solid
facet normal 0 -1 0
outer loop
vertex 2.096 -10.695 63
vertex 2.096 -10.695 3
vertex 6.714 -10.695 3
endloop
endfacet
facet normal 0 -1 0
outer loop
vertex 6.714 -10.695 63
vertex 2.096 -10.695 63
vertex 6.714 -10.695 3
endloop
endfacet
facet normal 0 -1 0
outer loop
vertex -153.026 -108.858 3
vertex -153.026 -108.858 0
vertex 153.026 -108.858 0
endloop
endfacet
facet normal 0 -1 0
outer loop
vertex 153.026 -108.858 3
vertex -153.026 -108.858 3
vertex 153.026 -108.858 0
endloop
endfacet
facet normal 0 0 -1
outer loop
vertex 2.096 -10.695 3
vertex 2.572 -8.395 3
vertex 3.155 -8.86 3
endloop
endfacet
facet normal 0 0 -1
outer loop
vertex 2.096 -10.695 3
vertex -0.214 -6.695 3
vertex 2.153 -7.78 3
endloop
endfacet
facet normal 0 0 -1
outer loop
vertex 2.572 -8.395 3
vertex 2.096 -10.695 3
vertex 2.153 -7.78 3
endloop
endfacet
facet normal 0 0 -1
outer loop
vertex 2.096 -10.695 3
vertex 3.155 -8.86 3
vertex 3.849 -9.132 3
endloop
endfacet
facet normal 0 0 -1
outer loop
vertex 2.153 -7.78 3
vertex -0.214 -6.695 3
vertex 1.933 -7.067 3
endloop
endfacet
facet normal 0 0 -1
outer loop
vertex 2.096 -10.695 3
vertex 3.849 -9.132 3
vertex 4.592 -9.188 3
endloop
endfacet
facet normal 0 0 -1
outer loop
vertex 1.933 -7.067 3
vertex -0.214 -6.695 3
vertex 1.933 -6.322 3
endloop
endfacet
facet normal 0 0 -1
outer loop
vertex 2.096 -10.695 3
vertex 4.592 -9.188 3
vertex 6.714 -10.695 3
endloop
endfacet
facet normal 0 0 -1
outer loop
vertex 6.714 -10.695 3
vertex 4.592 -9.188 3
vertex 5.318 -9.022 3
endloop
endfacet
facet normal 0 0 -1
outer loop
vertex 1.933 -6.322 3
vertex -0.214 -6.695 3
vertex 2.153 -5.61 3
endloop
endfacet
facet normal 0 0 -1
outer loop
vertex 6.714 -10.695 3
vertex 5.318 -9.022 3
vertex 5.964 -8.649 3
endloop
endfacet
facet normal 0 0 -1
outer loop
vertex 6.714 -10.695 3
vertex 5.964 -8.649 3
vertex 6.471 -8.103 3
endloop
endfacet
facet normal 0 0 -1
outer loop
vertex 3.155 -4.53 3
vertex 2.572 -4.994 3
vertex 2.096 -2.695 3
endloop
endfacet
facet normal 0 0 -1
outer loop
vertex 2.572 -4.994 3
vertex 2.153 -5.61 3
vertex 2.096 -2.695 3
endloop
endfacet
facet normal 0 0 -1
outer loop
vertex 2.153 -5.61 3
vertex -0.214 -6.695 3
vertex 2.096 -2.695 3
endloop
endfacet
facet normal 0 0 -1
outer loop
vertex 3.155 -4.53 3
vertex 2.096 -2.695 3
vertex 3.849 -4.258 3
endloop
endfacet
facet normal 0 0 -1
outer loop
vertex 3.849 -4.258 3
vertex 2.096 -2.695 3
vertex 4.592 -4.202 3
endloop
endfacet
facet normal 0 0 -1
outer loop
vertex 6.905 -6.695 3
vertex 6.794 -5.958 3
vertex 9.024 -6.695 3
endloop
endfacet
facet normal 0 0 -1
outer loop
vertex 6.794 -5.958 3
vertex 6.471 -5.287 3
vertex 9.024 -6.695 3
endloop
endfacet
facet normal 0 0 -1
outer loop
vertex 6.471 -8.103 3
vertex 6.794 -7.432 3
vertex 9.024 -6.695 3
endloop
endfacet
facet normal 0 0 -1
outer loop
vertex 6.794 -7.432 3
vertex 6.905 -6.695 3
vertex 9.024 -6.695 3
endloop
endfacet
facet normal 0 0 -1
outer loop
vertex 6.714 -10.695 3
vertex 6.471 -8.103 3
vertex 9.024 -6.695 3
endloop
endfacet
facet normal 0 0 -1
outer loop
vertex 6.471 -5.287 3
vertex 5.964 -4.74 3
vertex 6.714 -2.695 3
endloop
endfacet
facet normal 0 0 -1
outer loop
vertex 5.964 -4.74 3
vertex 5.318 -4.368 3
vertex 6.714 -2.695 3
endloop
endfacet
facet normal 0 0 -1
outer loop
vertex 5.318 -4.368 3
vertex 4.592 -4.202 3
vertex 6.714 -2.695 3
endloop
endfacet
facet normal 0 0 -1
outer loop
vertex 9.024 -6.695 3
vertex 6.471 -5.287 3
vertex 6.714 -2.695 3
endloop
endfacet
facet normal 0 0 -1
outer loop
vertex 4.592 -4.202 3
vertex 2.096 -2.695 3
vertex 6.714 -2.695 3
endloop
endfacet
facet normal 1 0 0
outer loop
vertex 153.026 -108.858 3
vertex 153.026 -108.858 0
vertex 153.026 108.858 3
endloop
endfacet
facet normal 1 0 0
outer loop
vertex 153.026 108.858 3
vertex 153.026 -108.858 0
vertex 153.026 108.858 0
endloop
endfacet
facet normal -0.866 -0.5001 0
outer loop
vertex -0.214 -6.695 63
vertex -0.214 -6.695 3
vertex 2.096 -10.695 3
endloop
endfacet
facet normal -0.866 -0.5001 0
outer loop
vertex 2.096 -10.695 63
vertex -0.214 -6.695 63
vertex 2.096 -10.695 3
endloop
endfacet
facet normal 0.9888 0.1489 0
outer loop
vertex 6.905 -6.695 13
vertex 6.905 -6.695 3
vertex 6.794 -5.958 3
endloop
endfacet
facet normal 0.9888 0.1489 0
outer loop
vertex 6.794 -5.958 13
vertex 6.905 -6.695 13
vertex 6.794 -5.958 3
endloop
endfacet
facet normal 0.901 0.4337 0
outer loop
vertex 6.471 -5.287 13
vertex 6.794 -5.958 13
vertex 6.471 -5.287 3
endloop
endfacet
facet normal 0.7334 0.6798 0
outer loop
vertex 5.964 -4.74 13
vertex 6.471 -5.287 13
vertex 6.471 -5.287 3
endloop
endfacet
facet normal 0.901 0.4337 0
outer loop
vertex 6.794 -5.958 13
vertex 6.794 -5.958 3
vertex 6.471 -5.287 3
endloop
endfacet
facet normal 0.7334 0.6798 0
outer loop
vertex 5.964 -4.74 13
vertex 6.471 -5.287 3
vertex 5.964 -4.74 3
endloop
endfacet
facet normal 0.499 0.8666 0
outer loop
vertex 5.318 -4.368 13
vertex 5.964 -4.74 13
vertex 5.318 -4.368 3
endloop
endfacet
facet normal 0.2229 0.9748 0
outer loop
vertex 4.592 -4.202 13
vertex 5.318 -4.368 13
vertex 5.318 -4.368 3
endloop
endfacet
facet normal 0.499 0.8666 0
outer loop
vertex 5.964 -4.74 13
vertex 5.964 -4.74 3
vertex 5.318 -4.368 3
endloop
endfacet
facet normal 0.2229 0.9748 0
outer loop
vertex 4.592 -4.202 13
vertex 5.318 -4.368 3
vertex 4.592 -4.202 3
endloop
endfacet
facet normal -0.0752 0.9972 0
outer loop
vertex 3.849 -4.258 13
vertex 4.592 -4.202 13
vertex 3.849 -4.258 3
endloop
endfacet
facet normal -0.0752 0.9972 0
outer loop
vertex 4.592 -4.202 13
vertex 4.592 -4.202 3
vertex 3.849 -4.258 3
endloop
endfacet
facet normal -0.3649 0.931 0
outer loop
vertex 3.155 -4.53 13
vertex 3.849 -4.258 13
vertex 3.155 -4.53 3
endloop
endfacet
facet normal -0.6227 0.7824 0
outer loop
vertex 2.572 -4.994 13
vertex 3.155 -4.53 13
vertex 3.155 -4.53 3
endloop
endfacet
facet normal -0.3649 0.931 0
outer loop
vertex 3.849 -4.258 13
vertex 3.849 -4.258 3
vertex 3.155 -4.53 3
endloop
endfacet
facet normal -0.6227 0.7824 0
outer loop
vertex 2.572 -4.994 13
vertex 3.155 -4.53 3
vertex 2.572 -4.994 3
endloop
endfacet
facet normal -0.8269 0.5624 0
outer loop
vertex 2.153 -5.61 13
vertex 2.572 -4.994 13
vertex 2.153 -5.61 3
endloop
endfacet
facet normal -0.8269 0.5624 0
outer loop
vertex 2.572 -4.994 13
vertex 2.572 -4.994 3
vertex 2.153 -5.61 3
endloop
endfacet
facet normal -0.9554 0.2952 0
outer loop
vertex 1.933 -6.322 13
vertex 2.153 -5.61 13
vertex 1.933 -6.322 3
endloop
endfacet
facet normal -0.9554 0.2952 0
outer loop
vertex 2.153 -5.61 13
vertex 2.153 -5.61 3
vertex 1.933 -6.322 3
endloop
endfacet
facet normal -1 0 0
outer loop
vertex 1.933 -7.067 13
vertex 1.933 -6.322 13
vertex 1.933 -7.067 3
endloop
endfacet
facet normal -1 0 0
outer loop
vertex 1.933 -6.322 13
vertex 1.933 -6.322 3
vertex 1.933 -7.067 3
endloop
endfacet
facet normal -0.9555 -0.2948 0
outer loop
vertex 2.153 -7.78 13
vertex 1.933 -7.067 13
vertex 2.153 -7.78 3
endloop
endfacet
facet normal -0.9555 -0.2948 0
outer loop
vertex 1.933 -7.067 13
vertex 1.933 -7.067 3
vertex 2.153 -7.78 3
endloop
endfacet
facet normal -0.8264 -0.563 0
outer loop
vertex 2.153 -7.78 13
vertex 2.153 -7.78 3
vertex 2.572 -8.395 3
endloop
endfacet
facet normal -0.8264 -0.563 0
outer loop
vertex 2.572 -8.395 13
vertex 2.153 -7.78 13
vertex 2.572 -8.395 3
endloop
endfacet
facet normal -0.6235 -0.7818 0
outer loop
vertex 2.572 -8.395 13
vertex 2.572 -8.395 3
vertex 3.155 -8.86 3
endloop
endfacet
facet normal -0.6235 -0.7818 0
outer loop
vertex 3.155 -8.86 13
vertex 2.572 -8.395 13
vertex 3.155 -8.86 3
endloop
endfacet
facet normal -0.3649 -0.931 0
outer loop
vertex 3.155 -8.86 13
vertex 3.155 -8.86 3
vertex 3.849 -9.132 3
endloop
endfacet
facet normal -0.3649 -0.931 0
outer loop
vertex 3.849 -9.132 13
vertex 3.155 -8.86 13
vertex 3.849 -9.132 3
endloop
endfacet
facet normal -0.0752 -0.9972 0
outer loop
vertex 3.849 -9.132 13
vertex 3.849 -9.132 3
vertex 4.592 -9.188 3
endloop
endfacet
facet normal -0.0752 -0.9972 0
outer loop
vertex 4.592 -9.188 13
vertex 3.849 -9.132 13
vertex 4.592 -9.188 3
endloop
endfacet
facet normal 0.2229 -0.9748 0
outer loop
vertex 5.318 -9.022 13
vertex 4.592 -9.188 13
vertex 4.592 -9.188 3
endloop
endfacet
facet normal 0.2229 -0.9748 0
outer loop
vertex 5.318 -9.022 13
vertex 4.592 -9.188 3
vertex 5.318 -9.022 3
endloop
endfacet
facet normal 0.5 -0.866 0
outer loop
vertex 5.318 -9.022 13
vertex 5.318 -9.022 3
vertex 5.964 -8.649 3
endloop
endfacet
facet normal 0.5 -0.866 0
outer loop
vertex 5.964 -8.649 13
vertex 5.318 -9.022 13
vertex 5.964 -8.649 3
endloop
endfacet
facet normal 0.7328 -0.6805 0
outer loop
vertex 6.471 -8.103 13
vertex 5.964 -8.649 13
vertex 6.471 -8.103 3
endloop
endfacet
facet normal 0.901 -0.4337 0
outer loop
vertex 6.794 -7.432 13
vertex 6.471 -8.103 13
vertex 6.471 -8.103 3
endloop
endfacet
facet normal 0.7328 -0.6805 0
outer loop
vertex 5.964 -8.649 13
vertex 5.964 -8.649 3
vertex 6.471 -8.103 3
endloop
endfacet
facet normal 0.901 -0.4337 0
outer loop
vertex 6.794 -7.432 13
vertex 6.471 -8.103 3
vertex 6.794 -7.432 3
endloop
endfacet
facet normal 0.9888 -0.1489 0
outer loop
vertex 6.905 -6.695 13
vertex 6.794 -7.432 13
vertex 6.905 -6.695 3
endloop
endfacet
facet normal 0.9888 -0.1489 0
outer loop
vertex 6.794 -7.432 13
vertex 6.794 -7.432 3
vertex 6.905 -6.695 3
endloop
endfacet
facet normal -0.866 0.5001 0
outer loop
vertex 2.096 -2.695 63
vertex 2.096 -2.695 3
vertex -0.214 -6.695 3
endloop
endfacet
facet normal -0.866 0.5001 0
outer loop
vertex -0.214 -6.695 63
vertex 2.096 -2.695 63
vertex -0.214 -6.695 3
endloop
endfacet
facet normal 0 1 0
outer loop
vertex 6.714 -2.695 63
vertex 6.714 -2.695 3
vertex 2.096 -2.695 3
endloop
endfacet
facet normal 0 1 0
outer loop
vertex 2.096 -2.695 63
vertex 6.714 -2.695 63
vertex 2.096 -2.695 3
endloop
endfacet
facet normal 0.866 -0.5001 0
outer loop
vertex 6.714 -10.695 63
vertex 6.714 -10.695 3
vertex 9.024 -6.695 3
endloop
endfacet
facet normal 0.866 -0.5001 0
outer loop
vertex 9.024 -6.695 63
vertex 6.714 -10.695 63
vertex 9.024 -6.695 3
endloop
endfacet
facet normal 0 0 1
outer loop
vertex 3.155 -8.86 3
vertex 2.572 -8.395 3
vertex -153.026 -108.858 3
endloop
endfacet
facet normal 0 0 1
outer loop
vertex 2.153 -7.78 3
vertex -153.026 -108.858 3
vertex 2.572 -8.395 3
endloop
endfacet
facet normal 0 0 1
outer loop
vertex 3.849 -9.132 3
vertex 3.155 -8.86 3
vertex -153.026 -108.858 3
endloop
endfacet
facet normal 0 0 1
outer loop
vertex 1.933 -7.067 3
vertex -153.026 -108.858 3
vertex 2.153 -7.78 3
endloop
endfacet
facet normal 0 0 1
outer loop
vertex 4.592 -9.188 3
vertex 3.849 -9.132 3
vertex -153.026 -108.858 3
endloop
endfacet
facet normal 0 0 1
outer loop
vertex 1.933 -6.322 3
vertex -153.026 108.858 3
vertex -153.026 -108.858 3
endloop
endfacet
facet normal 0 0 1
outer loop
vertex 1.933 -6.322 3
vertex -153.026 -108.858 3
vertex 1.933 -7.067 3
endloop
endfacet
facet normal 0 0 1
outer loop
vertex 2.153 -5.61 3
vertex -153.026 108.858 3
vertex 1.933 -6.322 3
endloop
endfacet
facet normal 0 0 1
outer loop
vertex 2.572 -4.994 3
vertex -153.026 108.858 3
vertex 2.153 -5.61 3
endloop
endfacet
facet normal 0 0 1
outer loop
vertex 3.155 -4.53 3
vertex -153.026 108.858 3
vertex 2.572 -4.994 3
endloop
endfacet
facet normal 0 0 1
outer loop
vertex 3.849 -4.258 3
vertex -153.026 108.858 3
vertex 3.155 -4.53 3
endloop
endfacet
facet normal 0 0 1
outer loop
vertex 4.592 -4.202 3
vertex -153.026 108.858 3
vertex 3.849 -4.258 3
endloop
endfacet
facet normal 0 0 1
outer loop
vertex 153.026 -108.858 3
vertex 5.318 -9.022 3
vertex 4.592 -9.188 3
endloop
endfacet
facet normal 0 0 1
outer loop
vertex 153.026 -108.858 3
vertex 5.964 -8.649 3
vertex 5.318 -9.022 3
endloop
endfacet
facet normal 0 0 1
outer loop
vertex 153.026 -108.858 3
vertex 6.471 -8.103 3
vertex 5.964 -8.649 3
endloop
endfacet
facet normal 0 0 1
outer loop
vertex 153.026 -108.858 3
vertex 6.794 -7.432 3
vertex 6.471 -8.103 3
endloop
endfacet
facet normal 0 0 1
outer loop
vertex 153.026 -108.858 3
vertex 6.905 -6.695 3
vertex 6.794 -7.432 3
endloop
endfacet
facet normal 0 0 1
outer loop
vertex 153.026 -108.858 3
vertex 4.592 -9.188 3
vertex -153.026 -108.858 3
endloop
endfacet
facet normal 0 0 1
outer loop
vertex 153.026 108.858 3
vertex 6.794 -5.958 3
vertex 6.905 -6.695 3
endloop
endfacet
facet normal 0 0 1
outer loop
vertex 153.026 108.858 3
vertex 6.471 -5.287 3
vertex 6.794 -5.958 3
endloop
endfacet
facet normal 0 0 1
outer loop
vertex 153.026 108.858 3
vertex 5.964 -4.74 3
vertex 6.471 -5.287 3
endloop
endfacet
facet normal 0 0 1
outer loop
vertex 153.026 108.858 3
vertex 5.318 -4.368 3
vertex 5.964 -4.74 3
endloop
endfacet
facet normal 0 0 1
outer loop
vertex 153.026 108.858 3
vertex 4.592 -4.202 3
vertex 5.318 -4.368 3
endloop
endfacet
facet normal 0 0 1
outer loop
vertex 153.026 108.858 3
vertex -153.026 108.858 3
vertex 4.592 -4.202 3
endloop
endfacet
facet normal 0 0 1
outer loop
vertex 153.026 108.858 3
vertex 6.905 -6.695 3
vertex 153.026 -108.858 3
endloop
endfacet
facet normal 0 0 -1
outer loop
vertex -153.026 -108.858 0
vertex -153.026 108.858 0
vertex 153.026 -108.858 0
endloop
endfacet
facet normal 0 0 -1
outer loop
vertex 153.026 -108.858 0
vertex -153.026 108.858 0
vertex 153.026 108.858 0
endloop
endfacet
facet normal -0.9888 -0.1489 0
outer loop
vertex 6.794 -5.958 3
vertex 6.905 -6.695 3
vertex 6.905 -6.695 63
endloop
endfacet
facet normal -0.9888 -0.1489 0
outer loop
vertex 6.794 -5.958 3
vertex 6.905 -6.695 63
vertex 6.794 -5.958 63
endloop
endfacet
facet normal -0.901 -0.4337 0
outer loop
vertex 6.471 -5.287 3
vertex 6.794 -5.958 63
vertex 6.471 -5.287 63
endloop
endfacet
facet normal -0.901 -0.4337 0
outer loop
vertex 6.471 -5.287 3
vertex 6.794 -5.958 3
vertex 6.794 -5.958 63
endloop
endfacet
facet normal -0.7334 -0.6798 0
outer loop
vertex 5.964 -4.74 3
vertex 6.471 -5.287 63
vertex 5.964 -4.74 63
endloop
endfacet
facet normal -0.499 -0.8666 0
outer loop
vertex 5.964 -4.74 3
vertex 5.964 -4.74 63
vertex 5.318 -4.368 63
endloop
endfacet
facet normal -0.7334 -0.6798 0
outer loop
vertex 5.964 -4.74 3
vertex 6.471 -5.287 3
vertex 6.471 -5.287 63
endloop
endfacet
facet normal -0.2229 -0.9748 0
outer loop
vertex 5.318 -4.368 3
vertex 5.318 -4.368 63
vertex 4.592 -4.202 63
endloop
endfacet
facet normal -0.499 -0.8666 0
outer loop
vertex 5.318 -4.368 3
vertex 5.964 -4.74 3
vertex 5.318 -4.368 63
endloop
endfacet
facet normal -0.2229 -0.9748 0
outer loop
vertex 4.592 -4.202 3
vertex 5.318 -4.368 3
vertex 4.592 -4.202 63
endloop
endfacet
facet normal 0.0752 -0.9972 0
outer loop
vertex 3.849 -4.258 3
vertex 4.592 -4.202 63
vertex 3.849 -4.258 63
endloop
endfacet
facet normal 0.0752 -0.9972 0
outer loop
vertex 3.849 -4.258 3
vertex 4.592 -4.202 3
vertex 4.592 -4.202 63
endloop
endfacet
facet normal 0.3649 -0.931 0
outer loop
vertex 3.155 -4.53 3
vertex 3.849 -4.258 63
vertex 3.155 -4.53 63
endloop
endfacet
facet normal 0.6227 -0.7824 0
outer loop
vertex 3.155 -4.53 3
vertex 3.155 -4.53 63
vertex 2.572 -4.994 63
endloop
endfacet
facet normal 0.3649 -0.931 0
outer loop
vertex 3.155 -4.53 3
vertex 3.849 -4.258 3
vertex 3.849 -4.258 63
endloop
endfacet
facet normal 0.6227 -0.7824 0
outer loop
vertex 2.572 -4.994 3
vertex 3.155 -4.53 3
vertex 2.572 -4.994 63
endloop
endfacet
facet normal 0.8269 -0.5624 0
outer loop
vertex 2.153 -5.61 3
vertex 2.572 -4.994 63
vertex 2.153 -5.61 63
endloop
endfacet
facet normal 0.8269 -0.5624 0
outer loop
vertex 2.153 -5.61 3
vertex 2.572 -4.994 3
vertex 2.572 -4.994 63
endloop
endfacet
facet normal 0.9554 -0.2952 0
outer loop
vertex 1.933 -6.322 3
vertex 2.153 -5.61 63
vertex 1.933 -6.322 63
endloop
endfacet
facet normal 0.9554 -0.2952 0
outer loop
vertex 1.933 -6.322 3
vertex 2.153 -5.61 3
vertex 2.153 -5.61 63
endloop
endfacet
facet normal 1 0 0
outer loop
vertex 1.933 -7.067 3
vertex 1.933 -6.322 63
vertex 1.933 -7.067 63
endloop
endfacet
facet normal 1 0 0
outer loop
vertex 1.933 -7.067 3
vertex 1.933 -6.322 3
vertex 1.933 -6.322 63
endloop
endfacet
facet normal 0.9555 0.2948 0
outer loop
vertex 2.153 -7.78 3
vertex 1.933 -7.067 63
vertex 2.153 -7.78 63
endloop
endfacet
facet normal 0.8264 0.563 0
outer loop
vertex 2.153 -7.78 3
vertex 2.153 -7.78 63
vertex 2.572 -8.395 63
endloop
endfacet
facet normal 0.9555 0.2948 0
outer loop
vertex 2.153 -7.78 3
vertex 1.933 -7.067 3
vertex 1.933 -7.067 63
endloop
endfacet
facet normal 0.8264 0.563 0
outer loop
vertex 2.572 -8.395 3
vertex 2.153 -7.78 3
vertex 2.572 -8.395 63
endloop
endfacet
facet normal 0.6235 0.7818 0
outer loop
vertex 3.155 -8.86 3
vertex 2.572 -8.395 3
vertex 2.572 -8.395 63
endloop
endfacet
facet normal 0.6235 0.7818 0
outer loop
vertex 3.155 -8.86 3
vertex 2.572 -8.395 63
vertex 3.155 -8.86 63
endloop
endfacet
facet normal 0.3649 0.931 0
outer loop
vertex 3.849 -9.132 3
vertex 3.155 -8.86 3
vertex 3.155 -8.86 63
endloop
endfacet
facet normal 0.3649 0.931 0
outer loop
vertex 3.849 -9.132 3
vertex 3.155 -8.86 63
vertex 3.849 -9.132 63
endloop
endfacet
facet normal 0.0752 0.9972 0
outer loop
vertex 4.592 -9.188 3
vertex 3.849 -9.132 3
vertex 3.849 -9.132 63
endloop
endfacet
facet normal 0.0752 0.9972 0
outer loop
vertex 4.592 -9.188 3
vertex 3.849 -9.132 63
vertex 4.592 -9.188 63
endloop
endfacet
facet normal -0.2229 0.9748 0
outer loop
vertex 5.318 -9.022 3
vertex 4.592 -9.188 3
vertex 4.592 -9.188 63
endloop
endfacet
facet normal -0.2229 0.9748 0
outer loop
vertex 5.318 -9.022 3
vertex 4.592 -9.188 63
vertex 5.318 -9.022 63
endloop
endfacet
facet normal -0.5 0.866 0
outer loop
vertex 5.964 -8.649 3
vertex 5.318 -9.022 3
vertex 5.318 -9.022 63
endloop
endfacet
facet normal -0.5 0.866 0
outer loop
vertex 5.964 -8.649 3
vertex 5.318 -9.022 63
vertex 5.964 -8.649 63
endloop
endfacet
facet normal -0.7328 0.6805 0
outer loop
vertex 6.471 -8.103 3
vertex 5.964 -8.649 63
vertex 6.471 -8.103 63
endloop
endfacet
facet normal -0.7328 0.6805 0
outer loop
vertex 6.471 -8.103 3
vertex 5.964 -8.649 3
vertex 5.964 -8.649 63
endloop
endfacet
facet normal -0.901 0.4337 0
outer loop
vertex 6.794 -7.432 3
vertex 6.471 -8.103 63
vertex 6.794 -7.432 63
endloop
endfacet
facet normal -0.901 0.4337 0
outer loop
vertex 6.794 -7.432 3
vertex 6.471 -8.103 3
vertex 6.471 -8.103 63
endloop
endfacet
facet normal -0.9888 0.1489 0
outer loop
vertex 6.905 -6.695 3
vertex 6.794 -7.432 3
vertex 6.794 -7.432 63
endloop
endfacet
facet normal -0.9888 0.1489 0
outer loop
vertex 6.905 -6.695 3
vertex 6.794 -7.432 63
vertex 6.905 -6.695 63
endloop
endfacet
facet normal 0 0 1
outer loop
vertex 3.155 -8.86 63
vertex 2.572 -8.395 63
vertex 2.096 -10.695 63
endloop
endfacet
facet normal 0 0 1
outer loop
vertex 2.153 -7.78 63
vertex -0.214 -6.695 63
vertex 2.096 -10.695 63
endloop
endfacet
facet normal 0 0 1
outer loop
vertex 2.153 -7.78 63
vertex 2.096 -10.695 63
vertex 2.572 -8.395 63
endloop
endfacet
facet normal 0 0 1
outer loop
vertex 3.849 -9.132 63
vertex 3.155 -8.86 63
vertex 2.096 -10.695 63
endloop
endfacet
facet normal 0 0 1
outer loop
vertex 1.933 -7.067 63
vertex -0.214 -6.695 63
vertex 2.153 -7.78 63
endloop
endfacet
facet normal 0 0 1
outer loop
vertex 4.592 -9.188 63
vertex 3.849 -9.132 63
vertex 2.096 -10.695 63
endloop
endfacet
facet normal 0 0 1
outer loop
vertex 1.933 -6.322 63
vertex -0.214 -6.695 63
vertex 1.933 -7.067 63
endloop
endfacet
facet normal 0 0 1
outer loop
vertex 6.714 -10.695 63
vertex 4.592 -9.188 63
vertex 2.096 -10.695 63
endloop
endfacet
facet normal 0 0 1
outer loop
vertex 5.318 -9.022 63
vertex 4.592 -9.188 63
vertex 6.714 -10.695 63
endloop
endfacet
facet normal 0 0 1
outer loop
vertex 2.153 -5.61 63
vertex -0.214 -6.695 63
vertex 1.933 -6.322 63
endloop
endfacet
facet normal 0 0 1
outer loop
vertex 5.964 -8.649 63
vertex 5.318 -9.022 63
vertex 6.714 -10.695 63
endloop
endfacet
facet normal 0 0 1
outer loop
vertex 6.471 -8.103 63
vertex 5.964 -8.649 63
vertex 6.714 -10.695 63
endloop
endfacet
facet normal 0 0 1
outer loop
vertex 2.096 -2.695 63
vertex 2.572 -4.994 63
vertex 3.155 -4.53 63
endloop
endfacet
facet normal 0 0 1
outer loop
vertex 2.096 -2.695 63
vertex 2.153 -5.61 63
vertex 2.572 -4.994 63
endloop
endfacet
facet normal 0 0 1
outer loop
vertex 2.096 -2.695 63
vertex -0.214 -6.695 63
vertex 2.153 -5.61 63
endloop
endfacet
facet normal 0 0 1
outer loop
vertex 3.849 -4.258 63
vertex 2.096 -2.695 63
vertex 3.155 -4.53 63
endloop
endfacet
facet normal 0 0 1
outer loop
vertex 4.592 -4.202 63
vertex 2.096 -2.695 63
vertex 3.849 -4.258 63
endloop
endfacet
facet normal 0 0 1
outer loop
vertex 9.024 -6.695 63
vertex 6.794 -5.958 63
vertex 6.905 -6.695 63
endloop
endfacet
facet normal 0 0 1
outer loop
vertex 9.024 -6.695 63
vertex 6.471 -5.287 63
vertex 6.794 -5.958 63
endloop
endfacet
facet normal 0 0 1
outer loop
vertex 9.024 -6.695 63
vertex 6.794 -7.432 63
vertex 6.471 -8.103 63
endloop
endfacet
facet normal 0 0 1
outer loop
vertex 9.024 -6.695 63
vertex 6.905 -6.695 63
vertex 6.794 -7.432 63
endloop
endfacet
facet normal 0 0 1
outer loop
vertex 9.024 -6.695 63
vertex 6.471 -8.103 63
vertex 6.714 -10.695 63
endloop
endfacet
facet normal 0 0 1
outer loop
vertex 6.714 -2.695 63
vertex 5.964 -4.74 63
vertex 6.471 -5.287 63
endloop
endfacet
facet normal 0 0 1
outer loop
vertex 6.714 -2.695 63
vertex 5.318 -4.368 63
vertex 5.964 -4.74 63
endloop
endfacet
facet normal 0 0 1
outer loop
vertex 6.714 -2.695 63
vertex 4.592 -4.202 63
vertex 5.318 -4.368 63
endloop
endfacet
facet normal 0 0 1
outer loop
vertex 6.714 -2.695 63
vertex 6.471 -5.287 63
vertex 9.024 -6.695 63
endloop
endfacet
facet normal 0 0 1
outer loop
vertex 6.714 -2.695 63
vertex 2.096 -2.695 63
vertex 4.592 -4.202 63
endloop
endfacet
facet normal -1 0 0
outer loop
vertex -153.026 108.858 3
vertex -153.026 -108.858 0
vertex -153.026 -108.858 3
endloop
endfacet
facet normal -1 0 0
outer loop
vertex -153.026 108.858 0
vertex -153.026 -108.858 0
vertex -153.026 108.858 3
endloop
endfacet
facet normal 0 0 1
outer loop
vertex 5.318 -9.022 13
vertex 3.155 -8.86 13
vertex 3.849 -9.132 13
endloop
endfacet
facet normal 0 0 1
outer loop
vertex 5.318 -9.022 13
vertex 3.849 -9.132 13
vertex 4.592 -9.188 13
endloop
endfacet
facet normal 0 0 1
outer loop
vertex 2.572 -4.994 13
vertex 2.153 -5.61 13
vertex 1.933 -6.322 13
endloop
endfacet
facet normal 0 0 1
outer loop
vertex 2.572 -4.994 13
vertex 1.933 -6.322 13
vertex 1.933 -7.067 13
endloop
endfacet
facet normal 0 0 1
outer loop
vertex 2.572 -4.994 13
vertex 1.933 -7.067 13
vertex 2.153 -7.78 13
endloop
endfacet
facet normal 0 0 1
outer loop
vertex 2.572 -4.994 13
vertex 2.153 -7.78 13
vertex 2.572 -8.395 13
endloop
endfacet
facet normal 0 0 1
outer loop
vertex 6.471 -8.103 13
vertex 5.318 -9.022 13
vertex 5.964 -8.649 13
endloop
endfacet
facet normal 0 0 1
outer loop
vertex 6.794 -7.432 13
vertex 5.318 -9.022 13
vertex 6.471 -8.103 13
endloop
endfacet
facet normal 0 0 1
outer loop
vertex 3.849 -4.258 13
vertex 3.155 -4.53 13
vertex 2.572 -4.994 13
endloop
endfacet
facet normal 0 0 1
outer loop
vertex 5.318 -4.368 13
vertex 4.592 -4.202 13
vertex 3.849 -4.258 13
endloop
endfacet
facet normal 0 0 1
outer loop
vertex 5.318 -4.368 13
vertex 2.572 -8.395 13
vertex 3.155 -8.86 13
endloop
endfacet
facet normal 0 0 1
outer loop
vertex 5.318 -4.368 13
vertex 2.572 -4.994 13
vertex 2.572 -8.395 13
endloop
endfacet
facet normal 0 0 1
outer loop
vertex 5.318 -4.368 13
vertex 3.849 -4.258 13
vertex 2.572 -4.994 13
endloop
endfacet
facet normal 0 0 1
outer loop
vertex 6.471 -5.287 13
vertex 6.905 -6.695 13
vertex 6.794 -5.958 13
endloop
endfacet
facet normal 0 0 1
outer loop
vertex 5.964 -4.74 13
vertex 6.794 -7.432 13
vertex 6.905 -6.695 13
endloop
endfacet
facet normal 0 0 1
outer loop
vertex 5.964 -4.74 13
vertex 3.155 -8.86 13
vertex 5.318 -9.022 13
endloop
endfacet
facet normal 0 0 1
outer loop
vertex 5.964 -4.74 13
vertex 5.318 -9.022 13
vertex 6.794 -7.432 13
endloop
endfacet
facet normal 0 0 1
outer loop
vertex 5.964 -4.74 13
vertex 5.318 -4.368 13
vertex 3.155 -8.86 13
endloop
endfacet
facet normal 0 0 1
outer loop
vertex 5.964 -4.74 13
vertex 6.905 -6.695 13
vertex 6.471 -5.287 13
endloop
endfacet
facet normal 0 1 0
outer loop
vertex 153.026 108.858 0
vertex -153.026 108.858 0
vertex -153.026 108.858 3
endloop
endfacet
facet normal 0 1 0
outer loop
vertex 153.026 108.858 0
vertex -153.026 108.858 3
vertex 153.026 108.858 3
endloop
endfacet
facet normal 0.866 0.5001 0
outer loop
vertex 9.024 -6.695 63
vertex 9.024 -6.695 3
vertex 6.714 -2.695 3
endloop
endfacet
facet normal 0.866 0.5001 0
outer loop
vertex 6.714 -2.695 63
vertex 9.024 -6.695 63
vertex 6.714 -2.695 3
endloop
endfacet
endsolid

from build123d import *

# Parameters (mm, degrees)
F0_W     = 306.051374
F0_H     = 217.715024
F1_DEPTH = 3
F2_R     = 2.5
F3_DEPTH = 10
F4_DEPTH = 60


with BuildPart() as f1:
    # F0 (on Top) → F1 (new body)
    with BuildSketch(Plane.XY):
        Rectangle(F0_W, F0_H)
    extrude(amount=F1_DEPTH)

    # F2 (on face) → F3 (join)
    with BuildSketch(Plane.XY.offset(3)):
        with Locations((4.40499, -6.694891)):
            Circle(F2_R)
    extrude(amount=F3_DEPTH)


with BuildPart() as f4:
    # F2 (on face) → F4 (new body)
    with BuildSketch(Plane.XY.offset(3)):
        Polygon((6.714391, -2.694891), (2.095589, -2.694891), (-0.213812, -6.694891), (2.095589, -10.694891), (6.714391, -10.694891), (9.023792, -6.694891), align=None)
        with Locations((4.40499, -6.694891)):
            Circle(F2_R, mode=Mode.SUBTRACT)
    extrude(amount=F4_DEPTH)


solid = Compound([f1.part, f4.part])
